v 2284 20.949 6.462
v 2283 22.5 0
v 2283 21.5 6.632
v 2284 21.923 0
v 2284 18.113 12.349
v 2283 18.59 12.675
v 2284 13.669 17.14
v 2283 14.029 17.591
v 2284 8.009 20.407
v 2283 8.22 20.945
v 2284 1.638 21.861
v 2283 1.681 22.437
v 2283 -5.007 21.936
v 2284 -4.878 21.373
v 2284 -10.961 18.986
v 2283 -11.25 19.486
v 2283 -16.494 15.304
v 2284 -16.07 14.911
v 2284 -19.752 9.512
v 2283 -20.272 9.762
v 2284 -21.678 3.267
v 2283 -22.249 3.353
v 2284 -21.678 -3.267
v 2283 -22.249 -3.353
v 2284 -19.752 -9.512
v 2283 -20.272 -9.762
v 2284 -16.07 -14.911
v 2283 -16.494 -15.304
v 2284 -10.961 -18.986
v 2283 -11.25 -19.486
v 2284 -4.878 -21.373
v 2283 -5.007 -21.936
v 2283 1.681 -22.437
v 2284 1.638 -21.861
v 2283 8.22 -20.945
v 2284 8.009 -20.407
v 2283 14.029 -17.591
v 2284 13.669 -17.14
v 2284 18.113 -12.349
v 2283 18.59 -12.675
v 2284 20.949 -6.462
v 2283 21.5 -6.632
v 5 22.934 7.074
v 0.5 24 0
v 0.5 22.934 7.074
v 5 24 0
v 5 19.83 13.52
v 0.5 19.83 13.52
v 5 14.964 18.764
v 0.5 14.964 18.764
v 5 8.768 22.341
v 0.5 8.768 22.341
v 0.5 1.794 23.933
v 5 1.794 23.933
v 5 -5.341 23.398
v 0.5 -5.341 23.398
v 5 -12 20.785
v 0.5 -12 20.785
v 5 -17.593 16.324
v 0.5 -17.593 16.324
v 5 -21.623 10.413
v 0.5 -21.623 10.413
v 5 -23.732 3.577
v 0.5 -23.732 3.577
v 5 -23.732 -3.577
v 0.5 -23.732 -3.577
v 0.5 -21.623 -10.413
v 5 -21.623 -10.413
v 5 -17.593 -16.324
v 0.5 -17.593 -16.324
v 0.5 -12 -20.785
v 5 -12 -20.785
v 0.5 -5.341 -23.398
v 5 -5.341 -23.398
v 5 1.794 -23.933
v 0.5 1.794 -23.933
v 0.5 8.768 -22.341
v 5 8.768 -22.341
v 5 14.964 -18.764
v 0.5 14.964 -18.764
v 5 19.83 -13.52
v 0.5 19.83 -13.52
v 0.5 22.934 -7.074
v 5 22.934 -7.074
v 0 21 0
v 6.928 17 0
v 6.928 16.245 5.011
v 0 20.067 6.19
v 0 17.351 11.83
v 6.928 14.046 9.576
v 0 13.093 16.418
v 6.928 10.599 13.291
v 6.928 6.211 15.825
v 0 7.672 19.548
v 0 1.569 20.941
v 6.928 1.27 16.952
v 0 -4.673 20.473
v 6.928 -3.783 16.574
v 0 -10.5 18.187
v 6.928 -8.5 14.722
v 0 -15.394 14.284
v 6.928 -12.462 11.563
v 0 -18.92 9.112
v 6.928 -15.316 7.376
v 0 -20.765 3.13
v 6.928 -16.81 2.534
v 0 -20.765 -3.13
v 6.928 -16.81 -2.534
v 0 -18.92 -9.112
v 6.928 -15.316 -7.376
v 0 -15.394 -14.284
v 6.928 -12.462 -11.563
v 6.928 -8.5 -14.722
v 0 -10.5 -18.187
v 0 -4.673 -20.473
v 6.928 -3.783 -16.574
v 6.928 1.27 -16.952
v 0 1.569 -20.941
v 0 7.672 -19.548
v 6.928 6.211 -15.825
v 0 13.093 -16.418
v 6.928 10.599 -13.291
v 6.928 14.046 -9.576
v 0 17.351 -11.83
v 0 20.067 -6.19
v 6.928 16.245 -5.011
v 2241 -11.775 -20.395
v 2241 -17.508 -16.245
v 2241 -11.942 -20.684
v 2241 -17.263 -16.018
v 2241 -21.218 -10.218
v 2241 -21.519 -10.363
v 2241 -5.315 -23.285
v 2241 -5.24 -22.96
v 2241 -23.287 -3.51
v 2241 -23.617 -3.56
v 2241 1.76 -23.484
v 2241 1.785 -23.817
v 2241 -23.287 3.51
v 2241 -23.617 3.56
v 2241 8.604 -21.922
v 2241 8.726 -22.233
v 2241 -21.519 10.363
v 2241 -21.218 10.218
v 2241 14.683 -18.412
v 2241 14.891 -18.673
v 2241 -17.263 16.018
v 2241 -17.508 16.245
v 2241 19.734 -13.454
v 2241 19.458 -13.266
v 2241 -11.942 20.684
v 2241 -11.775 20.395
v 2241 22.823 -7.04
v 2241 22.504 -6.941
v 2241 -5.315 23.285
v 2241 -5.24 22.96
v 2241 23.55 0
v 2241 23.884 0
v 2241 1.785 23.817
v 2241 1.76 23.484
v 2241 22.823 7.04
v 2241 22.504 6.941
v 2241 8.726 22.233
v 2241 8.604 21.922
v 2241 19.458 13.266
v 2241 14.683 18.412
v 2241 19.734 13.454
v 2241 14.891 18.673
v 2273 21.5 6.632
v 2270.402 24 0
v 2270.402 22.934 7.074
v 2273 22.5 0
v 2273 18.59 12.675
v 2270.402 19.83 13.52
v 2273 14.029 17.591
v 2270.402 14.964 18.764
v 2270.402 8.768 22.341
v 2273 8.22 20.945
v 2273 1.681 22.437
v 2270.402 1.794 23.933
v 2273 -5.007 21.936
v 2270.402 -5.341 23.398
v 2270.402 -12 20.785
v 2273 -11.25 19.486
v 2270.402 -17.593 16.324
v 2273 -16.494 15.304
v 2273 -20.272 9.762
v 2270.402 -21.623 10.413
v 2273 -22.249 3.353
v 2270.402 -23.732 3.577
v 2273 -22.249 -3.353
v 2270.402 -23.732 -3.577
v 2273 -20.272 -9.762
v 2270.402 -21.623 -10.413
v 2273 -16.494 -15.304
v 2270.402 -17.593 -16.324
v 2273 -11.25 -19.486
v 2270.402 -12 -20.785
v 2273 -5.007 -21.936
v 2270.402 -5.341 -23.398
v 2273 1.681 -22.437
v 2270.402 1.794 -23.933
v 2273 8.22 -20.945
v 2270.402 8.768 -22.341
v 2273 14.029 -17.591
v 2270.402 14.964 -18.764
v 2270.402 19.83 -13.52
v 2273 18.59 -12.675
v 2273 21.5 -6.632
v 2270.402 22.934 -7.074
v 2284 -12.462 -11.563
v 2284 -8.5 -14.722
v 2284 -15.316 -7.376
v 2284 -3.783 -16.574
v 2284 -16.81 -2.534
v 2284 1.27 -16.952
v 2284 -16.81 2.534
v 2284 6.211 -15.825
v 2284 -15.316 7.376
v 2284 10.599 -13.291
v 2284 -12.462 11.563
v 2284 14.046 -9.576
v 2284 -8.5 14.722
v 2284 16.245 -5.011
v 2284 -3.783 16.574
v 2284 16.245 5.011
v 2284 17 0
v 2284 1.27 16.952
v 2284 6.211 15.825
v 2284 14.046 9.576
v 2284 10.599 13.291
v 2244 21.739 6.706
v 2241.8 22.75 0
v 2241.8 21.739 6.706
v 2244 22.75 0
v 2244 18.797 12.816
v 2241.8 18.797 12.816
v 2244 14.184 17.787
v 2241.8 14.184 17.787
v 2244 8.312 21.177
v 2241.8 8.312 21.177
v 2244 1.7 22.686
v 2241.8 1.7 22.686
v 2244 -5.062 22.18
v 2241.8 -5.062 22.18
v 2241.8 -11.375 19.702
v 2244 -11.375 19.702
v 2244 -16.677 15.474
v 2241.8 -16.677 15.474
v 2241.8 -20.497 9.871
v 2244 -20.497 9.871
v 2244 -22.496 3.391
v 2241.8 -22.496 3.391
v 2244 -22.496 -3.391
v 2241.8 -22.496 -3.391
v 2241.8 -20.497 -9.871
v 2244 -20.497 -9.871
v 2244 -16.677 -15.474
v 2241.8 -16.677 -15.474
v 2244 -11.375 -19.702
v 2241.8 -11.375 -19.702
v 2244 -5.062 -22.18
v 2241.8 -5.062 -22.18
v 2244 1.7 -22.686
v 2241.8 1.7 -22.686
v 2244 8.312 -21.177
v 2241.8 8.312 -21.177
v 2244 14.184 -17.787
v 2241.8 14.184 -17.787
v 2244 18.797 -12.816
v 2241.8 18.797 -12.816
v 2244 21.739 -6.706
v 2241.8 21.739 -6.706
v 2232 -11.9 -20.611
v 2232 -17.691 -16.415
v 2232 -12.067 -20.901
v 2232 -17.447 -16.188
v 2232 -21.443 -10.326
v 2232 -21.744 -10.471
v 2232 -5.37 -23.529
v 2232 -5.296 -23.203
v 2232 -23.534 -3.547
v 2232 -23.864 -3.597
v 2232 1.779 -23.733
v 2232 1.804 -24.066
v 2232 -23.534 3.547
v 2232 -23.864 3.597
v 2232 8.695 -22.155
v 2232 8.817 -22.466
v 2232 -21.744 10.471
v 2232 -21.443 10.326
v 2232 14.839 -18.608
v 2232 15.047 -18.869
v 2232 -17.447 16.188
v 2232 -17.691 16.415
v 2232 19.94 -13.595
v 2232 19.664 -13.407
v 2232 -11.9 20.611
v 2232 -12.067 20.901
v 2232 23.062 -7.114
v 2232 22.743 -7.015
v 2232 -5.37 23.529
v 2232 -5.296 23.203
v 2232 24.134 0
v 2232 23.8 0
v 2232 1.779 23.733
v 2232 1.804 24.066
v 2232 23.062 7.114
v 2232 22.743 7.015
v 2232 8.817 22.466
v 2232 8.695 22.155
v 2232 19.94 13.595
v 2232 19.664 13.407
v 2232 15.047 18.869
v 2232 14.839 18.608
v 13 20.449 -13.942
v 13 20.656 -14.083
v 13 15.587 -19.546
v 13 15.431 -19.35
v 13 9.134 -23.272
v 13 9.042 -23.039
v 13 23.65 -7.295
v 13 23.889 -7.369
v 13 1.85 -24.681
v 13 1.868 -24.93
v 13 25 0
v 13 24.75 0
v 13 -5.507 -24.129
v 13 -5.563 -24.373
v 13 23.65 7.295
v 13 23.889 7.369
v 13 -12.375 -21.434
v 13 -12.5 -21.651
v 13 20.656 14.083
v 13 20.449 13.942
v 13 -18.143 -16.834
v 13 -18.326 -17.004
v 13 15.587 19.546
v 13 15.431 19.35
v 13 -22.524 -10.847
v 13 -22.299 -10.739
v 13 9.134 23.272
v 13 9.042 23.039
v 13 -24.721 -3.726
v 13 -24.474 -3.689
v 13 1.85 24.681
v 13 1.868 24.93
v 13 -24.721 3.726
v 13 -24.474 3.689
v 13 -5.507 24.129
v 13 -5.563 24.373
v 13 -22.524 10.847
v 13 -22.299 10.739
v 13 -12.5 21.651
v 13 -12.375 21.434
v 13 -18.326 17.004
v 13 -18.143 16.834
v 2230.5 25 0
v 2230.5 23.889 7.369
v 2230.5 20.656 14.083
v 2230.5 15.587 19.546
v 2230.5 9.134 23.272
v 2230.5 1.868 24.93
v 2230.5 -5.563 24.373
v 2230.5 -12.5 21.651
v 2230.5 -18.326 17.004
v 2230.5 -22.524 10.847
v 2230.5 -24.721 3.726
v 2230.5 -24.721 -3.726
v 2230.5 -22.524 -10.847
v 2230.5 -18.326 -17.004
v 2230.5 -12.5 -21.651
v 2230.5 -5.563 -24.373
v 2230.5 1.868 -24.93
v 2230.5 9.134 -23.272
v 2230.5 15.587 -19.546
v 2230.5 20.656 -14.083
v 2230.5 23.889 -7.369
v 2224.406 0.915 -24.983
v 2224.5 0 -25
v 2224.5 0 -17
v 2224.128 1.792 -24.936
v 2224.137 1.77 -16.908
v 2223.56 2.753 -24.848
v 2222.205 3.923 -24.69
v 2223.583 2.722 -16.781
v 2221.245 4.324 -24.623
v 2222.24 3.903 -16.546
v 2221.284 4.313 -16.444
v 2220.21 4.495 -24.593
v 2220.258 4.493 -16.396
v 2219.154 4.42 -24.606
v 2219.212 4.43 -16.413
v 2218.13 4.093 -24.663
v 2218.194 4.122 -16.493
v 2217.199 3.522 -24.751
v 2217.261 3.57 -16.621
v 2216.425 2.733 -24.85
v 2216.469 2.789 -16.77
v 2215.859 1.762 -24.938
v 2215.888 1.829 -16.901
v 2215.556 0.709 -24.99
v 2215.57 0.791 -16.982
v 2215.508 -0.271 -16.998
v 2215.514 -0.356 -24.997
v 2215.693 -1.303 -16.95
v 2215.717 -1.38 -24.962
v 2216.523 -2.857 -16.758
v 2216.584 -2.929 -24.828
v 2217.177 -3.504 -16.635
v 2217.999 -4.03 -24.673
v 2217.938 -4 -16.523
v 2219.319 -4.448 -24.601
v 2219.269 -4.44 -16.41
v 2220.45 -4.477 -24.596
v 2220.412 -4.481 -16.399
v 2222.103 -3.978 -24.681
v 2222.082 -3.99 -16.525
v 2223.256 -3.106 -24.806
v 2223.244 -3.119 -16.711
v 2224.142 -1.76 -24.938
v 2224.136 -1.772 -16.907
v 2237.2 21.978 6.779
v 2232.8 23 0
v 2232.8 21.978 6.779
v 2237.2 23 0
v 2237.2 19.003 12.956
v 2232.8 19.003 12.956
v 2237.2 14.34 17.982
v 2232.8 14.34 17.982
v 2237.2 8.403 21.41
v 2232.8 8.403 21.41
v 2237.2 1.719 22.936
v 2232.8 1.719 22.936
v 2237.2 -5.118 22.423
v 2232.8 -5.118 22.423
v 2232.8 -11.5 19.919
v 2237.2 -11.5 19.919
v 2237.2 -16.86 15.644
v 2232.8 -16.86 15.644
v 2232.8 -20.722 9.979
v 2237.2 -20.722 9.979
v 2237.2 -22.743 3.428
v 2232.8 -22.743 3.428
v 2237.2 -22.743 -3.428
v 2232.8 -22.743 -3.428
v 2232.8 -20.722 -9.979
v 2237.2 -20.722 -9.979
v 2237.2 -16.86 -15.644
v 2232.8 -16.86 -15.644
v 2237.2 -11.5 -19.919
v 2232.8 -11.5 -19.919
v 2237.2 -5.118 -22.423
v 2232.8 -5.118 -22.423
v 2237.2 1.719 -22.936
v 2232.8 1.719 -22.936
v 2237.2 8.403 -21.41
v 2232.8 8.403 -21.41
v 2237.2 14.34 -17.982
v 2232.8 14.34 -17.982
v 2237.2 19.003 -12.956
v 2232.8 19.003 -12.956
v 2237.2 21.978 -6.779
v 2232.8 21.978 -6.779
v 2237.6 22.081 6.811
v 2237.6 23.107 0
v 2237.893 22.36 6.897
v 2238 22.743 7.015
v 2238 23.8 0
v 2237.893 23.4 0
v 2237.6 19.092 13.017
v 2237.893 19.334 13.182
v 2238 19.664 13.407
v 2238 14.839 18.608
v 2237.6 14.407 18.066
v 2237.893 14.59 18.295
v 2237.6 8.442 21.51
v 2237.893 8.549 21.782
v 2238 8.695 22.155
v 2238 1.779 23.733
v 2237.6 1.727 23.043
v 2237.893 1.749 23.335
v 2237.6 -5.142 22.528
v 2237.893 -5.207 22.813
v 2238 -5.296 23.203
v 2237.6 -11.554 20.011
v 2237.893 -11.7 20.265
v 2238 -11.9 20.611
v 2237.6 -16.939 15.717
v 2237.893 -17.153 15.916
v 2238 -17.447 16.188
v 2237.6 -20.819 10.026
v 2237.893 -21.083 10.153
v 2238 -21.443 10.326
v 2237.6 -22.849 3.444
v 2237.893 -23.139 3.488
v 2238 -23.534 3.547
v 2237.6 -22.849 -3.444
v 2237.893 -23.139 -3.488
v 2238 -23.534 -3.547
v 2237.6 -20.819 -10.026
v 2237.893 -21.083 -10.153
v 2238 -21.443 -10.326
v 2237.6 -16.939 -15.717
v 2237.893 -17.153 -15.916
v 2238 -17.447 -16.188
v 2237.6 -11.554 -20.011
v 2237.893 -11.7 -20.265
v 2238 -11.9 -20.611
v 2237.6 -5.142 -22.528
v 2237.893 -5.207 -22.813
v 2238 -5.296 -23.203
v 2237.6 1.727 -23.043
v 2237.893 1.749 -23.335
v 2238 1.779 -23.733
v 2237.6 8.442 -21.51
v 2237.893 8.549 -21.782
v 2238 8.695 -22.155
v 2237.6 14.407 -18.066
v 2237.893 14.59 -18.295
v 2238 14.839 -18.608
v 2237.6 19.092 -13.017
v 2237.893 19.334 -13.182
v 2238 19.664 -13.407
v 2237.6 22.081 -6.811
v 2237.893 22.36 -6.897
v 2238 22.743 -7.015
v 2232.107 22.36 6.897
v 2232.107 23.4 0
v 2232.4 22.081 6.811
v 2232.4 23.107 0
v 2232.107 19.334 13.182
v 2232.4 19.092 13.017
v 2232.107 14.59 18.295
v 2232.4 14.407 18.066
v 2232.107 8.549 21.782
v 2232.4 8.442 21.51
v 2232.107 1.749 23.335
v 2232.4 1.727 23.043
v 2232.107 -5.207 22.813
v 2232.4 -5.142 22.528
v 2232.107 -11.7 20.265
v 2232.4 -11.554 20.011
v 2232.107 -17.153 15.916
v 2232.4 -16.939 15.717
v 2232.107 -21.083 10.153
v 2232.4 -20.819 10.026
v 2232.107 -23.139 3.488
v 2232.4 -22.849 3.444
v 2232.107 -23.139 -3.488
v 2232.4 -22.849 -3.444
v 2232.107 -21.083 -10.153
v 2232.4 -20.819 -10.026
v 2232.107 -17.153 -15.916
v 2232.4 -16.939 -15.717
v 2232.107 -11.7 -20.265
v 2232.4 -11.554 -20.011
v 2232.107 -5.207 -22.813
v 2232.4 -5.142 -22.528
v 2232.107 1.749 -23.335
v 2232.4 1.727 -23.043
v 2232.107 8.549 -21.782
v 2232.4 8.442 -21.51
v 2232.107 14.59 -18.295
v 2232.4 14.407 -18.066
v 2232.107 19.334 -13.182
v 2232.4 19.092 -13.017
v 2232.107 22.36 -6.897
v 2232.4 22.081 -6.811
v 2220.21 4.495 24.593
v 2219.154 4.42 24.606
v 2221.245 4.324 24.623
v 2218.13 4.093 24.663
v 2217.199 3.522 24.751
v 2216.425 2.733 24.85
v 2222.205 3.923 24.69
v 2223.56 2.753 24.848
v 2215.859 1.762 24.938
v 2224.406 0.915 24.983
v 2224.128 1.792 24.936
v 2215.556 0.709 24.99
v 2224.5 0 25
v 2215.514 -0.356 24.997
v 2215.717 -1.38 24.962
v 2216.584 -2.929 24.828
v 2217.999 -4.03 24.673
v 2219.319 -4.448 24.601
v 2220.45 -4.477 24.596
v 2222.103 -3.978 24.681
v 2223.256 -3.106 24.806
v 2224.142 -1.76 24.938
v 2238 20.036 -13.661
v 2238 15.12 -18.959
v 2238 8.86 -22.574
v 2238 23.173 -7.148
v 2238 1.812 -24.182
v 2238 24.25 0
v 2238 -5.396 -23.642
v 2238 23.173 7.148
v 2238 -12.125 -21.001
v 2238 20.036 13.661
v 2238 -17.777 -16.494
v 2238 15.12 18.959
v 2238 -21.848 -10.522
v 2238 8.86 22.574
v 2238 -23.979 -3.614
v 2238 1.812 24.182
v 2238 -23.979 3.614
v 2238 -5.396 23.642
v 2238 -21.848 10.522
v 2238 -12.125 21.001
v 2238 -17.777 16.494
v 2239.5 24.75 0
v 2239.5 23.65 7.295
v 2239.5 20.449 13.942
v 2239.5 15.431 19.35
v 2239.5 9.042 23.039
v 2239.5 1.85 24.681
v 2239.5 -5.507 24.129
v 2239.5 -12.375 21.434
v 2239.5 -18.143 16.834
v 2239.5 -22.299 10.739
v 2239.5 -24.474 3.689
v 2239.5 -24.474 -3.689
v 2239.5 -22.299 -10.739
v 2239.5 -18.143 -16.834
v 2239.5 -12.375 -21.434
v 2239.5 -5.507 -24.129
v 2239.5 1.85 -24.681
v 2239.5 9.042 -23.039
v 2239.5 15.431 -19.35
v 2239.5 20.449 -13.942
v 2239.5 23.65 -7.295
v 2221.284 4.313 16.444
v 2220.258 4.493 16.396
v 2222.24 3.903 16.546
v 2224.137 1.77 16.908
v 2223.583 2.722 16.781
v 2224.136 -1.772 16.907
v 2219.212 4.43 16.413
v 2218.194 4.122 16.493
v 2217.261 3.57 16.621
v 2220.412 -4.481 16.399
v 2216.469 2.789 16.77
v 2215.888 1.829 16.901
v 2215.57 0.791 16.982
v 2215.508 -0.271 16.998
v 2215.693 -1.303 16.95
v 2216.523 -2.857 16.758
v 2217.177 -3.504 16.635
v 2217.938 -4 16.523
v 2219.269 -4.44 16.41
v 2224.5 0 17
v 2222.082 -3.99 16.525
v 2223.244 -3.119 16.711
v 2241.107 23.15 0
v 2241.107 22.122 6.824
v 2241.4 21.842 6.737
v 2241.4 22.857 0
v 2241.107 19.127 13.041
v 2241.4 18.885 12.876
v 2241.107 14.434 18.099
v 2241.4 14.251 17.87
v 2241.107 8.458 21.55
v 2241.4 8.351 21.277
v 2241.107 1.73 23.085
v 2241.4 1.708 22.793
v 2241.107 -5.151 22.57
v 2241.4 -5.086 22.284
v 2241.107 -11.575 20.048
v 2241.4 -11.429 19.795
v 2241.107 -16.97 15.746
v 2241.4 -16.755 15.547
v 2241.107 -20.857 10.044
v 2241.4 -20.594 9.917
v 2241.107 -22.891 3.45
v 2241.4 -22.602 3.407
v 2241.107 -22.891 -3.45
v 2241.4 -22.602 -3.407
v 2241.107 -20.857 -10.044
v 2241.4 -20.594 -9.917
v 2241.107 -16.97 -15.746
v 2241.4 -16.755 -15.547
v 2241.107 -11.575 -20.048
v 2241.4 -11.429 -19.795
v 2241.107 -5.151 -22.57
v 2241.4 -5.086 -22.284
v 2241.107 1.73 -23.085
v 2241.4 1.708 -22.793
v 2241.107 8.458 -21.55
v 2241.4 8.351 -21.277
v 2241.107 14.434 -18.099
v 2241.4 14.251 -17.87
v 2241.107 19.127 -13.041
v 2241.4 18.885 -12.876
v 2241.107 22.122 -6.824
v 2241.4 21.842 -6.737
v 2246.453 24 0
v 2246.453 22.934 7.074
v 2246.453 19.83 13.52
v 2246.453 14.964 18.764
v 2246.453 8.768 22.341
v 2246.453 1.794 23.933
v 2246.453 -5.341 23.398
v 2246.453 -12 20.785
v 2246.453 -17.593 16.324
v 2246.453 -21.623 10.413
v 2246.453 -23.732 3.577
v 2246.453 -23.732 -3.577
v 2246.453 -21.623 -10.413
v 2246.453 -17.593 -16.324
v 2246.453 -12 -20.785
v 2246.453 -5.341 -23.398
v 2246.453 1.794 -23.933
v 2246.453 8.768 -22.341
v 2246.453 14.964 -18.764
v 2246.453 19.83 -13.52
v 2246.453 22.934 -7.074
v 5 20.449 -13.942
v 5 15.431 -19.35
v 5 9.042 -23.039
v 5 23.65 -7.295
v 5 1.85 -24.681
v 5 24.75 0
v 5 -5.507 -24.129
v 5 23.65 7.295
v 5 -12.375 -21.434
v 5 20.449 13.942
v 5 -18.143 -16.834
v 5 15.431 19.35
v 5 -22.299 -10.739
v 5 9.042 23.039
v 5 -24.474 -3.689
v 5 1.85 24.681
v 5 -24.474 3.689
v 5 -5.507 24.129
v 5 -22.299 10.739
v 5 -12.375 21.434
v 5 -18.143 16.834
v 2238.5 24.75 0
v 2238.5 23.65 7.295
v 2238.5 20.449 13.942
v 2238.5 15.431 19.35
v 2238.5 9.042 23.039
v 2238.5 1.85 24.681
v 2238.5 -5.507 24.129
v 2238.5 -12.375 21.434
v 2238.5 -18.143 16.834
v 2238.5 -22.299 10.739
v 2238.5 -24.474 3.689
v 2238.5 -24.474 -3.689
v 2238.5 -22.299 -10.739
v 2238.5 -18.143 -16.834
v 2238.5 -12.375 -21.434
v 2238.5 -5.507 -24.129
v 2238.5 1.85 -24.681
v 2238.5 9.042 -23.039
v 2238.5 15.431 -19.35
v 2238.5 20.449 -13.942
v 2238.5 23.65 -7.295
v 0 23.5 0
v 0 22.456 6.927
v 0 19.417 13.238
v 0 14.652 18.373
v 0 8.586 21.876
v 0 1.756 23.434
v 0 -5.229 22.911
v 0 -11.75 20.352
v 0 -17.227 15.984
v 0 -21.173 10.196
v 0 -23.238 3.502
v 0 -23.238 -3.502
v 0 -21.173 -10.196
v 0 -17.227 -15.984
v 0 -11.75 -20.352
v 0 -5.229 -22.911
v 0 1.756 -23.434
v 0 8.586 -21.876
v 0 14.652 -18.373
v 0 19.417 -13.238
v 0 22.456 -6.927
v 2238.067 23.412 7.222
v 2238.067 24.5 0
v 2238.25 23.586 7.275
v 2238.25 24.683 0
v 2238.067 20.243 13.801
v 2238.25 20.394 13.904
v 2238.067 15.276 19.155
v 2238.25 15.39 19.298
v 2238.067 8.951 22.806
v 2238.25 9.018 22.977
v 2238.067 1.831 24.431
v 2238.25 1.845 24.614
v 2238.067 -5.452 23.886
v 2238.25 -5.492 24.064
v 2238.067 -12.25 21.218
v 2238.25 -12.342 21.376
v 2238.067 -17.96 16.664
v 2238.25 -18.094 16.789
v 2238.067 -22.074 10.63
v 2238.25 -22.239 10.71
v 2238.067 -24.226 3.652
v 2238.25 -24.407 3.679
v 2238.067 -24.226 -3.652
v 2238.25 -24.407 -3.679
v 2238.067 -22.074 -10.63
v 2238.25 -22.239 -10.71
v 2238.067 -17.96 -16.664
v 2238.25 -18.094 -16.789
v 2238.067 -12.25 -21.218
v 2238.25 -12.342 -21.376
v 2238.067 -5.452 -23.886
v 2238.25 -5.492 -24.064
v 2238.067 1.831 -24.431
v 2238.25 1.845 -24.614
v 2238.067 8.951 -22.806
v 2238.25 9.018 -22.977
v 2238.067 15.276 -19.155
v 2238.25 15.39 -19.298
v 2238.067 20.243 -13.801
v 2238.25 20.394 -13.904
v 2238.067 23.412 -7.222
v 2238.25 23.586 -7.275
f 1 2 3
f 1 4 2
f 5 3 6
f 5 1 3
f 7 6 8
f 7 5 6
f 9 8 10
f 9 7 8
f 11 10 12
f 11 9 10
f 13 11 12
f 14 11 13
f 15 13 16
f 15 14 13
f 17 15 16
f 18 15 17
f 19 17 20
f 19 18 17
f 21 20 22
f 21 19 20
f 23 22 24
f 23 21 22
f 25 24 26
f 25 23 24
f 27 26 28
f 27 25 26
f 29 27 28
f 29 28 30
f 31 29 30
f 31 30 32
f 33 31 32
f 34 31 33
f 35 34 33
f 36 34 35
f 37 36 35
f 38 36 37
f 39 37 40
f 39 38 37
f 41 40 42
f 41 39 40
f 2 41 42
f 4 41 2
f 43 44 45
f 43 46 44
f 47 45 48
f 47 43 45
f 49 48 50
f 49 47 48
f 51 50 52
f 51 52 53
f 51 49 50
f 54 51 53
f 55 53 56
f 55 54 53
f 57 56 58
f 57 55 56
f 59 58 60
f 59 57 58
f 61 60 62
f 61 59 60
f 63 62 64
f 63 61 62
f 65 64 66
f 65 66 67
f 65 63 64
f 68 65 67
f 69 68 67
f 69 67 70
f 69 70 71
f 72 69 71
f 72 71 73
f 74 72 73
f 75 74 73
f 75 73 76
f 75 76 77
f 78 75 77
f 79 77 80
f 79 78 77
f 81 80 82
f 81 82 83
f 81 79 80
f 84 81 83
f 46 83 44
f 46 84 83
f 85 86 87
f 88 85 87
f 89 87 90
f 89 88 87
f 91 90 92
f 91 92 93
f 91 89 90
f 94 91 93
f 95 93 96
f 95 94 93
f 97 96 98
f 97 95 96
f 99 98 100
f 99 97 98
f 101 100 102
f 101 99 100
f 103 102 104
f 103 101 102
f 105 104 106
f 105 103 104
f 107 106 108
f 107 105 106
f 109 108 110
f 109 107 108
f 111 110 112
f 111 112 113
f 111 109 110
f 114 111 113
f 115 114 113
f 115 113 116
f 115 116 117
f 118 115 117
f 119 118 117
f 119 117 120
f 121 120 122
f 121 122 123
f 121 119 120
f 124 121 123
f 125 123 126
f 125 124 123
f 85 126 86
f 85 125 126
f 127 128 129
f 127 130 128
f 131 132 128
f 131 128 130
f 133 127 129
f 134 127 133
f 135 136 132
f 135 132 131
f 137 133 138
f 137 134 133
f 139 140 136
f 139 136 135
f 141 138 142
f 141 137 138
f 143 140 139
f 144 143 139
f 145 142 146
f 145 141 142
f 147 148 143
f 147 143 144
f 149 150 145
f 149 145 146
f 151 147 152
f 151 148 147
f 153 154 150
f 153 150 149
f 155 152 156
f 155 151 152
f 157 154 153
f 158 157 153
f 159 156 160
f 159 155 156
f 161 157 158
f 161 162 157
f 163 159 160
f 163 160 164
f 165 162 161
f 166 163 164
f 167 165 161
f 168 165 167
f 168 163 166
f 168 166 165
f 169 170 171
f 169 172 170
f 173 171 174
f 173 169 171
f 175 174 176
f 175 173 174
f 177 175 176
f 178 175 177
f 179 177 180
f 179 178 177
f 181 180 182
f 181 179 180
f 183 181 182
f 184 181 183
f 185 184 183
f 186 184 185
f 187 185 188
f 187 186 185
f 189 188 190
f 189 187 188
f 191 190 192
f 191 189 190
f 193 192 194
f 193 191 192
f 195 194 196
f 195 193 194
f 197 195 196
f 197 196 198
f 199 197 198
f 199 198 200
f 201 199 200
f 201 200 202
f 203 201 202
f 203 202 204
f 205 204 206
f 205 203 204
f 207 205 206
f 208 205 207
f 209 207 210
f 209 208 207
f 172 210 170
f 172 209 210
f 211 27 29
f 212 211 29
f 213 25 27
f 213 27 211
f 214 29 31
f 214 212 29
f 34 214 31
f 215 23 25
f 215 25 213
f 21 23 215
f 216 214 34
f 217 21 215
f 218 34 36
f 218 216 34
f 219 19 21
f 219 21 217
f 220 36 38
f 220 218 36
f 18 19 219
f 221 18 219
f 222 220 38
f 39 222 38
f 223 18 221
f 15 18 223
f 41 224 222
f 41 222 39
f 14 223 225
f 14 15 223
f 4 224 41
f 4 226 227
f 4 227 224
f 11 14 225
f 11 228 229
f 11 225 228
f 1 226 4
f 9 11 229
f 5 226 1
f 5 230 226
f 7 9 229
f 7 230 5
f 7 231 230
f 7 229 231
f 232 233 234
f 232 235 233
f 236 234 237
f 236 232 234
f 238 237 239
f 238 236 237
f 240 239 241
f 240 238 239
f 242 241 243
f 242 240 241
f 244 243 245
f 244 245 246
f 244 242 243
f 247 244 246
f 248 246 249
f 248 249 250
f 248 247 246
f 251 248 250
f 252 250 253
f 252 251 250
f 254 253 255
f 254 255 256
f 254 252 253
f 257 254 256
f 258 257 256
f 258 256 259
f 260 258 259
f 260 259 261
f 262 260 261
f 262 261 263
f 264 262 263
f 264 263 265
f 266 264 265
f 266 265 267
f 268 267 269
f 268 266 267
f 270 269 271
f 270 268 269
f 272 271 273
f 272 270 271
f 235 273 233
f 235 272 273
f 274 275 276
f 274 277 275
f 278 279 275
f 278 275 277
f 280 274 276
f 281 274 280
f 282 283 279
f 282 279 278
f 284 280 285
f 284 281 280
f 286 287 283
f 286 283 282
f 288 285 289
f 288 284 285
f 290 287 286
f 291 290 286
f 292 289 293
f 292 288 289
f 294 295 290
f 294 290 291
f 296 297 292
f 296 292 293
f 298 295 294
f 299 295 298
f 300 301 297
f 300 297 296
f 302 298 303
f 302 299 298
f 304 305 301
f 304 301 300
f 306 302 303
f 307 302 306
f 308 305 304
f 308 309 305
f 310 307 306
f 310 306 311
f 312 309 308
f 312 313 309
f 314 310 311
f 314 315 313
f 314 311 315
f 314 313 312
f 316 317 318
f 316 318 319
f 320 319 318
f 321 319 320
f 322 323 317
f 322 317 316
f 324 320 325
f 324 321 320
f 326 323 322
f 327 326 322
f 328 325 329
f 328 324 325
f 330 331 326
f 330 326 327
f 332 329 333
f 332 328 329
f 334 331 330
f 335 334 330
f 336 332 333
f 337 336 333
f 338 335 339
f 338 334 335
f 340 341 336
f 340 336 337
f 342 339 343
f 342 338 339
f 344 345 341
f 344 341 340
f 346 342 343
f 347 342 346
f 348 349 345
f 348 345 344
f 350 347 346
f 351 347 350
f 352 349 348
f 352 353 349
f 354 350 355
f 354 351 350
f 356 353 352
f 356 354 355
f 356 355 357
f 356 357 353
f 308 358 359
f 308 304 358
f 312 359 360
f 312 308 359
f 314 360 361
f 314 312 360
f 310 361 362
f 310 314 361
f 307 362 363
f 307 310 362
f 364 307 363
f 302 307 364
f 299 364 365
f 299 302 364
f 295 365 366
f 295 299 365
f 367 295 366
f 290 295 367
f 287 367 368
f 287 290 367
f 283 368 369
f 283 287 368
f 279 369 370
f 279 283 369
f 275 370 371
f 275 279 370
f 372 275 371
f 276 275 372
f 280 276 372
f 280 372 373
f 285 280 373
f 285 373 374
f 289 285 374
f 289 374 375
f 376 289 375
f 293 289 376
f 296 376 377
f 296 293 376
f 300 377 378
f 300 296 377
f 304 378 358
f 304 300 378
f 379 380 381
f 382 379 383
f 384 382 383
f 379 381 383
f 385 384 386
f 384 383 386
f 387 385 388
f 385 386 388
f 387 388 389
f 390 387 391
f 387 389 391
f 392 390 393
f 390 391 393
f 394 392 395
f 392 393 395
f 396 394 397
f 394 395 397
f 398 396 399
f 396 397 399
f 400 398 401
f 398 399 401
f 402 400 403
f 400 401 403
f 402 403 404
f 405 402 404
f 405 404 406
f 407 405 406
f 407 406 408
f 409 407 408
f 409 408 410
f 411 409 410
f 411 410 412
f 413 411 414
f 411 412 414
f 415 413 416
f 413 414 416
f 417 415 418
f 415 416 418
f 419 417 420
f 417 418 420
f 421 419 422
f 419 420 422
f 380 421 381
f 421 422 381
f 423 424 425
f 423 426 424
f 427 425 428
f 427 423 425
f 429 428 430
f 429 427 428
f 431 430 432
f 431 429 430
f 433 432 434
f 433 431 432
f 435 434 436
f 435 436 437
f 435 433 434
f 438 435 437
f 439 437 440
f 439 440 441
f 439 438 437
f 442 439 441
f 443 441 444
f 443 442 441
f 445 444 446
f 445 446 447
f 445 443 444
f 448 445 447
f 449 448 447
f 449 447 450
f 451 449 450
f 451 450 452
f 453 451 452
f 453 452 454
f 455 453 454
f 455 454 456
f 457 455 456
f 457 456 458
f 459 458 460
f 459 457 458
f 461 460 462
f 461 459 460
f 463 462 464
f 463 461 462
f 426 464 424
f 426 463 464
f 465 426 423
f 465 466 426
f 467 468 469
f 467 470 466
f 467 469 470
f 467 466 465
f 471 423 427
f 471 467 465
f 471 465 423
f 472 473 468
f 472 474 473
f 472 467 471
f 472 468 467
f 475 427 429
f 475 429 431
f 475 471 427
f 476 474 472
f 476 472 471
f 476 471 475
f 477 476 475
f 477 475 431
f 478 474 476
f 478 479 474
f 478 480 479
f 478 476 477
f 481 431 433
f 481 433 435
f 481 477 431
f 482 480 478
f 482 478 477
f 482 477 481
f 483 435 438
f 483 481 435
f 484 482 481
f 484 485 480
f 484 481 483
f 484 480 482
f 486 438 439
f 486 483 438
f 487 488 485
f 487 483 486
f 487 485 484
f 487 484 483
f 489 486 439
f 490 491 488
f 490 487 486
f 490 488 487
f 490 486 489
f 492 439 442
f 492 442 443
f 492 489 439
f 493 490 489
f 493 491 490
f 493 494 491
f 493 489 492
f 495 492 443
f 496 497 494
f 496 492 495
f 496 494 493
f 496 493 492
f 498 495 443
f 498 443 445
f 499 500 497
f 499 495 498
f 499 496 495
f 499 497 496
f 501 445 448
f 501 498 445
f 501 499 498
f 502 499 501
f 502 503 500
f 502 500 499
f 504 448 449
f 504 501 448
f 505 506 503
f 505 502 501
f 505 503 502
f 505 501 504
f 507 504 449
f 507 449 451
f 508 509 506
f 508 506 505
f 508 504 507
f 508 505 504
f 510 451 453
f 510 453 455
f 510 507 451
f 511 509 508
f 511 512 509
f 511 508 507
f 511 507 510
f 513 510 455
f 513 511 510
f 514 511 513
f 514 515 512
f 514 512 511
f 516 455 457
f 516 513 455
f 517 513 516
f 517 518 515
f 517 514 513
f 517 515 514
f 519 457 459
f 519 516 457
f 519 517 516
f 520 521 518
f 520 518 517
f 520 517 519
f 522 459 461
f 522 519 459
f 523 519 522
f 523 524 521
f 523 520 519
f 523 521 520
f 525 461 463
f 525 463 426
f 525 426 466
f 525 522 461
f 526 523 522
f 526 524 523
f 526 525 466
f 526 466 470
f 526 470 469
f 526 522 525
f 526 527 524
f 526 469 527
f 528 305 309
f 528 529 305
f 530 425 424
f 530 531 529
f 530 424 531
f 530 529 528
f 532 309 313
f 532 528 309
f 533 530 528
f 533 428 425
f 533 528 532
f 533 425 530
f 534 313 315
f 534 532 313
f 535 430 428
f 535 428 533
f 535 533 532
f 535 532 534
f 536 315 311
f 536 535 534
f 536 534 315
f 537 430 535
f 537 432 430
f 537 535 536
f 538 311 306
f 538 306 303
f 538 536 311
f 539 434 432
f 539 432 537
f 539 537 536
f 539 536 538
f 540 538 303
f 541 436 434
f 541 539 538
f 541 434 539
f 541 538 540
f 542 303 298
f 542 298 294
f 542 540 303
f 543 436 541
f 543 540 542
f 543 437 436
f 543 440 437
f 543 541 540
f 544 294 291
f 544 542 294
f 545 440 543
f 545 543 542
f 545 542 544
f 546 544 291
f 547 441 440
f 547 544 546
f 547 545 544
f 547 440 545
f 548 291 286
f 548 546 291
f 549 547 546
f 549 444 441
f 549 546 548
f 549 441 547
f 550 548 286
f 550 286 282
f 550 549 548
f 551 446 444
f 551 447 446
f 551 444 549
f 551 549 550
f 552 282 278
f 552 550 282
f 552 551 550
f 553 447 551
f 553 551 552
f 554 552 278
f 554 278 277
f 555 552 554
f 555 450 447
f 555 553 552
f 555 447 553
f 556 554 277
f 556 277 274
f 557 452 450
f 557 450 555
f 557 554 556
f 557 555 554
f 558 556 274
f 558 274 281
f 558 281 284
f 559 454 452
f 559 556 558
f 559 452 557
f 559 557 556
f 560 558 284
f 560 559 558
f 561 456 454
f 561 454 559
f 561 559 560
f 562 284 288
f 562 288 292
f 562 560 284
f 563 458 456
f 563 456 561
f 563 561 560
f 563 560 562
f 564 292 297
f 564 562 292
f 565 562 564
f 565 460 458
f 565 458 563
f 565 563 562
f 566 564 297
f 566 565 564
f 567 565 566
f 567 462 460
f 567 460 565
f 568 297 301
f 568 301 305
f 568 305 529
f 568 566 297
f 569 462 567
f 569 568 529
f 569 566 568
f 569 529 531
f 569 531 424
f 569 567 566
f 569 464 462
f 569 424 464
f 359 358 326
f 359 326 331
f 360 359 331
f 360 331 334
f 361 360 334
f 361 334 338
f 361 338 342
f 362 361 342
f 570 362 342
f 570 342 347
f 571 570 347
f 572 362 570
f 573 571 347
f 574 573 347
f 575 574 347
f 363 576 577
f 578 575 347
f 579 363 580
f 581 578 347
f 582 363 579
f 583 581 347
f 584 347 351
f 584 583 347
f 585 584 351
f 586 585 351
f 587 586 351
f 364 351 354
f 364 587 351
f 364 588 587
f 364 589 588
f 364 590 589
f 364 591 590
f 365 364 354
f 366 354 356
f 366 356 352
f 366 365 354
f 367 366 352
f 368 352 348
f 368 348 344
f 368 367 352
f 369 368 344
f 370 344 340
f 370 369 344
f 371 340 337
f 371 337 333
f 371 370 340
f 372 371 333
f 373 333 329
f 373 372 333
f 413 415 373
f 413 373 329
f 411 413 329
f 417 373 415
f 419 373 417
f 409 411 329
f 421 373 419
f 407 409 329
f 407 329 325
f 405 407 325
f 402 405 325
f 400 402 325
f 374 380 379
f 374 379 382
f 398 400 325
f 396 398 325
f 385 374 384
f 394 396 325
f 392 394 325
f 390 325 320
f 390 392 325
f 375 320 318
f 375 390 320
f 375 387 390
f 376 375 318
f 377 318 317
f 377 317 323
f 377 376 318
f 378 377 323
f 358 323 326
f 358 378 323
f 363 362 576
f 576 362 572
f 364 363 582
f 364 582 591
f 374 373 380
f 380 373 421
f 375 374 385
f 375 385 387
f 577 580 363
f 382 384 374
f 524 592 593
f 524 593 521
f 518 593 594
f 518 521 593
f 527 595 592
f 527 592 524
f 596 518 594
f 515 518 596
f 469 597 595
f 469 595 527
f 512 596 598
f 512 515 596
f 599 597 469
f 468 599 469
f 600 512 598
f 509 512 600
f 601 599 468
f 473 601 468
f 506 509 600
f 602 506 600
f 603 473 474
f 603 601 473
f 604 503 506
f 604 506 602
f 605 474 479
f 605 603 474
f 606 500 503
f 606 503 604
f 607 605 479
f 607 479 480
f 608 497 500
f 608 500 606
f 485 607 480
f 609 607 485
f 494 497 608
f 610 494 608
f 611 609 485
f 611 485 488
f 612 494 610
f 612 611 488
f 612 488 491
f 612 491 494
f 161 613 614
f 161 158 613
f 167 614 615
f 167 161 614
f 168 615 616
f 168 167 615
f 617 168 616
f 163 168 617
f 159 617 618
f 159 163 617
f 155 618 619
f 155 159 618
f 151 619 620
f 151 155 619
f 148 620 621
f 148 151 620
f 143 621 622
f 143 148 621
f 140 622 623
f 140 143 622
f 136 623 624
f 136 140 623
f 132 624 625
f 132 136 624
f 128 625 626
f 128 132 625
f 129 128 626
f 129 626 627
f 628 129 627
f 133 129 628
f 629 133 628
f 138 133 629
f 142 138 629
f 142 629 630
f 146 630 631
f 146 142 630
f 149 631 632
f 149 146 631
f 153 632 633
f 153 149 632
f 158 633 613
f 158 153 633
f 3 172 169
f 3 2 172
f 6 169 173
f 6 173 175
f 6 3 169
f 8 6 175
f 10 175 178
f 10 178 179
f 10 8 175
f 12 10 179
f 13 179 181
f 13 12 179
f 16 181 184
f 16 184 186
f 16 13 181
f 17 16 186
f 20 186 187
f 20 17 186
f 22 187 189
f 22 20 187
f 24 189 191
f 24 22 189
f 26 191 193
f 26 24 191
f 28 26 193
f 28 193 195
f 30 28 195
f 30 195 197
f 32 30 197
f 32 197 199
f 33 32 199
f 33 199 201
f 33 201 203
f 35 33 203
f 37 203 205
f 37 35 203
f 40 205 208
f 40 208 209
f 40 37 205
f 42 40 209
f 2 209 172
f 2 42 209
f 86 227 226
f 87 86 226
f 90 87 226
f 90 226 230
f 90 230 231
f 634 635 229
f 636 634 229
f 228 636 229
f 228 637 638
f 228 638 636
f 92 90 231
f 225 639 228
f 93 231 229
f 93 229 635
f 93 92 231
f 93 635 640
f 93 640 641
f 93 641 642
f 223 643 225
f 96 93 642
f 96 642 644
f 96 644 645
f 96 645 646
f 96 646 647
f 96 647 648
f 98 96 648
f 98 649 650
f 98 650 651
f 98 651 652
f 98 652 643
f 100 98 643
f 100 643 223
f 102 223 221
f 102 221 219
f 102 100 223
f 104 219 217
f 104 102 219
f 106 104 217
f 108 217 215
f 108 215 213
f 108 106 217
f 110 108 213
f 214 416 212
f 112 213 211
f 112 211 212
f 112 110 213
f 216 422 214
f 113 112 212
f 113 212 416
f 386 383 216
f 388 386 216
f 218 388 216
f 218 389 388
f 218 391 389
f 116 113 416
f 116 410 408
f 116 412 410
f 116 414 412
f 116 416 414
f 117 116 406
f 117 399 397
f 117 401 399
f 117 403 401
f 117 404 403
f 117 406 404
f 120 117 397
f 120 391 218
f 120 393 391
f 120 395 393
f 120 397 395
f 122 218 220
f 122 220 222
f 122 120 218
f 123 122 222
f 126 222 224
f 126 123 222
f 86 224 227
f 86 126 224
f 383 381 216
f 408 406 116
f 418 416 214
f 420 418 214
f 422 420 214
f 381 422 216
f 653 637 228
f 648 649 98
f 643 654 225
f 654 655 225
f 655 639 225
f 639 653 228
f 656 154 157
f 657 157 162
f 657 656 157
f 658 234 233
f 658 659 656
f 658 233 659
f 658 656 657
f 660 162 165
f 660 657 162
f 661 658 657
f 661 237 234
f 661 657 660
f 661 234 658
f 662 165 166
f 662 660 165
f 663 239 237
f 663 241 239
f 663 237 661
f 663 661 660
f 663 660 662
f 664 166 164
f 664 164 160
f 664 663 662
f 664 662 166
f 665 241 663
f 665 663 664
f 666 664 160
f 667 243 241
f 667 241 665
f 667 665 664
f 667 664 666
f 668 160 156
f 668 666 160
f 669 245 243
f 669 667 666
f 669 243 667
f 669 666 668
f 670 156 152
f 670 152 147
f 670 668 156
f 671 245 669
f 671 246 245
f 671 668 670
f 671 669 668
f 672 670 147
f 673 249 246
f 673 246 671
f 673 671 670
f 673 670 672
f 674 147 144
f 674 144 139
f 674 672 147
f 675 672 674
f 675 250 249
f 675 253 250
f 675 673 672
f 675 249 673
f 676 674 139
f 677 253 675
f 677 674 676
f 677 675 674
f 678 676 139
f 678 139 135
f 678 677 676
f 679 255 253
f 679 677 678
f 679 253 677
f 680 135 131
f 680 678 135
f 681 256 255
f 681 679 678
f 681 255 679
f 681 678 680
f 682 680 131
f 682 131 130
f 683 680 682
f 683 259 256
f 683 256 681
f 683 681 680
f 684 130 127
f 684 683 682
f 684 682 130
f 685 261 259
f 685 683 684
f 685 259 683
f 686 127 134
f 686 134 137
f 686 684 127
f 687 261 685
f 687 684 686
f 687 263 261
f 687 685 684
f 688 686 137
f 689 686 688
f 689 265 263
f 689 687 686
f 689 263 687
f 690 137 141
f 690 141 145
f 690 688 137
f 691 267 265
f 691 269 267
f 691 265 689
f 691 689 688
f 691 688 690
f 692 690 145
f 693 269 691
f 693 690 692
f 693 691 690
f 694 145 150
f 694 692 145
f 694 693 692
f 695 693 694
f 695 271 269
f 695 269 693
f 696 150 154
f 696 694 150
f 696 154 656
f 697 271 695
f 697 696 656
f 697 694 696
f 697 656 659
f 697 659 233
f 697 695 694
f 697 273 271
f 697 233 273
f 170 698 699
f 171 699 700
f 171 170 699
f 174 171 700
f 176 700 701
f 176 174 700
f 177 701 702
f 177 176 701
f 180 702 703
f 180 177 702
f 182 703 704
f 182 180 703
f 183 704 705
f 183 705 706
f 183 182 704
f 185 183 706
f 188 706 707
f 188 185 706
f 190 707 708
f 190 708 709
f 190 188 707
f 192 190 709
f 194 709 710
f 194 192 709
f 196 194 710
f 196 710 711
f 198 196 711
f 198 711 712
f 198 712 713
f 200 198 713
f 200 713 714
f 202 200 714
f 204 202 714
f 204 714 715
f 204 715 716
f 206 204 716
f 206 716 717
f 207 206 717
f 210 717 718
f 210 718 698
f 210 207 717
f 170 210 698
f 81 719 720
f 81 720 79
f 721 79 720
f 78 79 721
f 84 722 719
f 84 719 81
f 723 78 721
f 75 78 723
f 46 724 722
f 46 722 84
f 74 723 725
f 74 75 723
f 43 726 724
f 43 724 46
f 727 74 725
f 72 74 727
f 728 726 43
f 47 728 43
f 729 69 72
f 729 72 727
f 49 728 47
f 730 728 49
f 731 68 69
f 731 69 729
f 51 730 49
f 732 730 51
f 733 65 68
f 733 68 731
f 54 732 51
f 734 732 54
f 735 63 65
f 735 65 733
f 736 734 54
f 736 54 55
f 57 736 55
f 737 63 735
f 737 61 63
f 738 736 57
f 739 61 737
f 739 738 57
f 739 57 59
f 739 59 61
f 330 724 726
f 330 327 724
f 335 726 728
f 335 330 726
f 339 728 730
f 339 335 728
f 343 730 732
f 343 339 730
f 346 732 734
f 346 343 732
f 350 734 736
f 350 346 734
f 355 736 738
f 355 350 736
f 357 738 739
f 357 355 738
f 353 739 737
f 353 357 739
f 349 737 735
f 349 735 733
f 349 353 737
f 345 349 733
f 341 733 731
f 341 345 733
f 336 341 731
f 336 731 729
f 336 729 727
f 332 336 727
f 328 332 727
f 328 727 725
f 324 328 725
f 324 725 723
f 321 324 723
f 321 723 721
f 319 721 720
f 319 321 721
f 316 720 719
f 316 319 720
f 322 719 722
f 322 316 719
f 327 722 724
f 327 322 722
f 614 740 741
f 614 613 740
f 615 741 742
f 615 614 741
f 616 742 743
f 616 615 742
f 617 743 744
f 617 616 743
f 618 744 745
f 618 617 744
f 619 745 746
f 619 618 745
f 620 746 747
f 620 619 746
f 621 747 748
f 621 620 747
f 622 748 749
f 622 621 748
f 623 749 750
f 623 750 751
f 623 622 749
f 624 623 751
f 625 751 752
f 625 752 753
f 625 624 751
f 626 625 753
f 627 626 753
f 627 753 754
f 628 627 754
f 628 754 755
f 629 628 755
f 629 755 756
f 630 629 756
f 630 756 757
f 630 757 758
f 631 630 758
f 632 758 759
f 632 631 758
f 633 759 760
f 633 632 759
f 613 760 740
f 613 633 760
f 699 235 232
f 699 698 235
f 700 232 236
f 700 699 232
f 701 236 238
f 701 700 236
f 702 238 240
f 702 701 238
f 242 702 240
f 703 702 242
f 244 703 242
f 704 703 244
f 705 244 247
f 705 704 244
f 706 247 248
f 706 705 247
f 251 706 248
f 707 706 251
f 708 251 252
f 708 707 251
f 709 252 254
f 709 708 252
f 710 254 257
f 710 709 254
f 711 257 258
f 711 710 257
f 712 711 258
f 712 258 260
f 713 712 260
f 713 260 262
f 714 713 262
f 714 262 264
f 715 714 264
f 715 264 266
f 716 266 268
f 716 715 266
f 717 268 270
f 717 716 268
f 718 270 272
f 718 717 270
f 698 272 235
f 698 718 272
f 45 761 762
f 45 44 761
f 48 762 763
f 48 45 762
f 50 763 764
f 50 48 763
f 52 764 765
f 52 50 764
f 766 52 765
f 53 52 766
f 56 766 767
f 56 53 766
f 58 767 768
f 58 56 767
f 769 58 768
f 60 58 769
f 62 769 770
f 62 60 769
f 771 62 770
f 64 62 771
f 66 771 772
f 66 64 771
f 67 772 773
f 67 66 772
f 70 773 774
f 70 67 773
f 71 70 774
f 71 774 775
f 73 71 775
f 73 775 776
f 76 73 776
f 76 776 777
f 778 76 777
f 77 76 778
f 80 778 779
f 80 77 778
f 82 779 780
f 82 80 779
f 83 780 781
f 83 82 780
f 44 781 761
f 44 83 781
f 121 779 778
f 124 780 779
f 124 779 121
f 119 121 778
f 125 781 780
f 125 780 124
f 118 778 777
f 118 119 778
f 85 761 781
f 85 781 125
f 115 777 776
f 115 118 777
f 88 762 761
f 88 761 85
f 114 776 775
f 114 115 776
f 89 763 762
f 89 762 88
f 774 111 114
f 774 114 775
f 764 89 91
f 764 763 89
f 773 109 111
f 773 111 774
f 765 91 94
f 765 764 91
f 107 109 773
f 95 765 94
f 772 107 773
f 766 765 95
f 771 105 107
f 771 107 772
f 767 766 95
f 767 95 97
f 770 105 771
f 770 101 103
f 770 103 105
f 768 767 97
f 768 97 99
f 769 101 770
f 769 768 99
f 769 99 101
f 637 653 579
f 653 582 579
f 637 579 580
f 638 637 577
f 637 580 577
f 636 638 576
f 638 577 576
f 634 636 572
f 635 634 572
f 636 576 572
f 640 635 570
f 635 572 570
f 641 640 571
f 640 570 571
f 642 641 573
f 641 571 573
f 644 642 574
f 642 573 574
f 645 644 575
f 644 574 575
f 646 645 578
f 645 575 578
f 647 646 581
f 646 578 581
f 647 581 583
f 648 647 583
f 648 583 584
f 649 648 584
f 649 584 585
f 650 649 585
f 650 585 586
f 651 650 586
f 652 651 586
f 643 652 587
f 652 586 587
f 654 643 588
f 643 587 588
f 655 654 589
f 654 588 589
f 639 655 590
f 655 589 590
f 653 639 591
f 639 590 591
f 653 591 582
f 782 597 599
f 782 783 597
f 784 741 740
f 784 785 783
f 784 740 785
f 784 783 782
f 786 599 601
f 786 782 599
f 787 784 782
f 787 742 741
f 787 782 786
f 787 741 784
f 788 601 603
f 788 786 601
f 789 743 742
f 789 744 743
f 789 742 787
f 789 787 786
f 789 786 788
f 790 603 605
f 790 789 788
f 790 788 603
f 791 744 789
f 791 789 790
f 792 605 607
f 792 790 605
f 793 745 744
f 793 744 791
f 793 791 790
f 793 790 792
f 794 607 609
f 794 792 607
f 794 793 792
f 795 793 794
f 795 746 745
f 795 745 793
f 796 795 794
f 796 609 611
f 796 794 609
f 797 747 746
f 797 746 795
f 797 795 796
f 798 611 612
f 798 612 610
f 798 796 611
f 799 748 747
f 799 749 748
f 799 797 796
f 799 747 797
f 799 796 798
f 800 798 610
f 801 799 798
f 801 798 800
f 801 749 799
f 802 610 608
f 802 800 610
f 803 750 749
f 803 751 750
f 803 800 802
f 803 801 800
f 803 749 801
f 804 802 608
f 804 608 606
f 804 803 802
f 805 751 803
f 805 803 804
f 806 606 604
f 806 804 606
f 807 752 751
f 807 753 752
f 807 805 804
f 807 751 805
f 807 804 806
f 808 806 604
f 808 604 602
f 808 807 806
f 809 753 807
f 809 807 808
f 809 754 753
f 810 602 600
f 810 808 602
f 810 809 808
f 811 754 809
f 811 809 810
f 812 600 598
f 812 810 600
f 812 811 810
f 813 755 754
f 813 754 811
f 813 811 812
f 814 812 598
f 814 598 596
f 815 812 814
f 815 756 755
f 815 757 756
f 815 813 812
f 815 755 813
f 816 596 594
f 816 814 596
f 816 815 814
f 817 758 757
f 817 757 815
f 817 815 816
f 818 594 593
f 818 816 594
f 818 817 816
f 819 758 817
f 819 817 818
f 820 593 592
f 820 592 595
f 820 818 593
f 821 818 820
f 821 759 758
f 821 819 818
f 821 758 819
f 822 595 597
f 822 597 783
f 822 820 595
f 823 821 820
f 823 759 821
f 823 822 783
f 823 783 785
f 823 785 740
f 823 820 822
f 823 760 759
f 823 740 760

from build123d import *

# Parameters (mm, degrees)
SKETCH2_R          = 4.5
CUT_EXTRUDE1_DEPTH = 50


with BuildPart() as part:
    # Sketch1 → Base-Revolve (revolve)
    with BuildSketch(Plane.XY):
        with BuildLine():
            Line((0, 21), (0, 23.5))
            Line((0, 23.5), (0.5, 24))
            Line((0.5, 24), (5, 24))
            Line((5, 24), (5, 24.75))
            Line((5, 24.75), (13, 24.75))
            Line((13, 24.75), (13, 25))
            Line((13, 25), (2230.5, 25))
            Line((2230.5, 25), (2232, 24.133974596))
            Line((2232, 24.133974596), (2232, 23.8))
            ThreePointArc((2232, 23.8), (2232.234314575, 23.234314575), (2232.8, 23))
            Line((2232.8, 23), (2237.2, 23))
            ThreePointArc((2237.2, 23), (2237.765685425, 23.234314575), (2238, 23.8))
            Line((2238, 23.8), (2238, 24.25))
            ThreePointArc((2238, 24.25), (2238.146446609, 24.603553391), (2238.5, 24.75))
            Line((2238.5, 24.75), (2239.5, 24.75))
            Line((2239.5, 24.75), (2241, 23.883974596))
            Line((2241, 23.883974596), (2241, 23.55))
            ThreePointArc((2241, 23.55), (2241.234314575, 22.984314575), (2241.8, 22.75))
            Line((2241.8, 22.75), (2244, 22.75))
            Line((2244, 22.75), (2246.453263132, 24))
            Line((2246.453263132, 24), (2270.401923789, 24))
            Line((2270.401923789, 24), (2273, 22.5))
            Line((2273, 22.5), (2283, 22.5))
            Line((2283, 22.5), (2284, 21.922649731))
            Line((2284, 21.922649731), (2284, 17))
            Line((2284, 17), (6.92820323, 17))
            Line((6.92820323, 17), (0, 21))
        make_face()
    revolve(axis=Axis((0, 0, 0), (1, 0, 0)))

    # Sketch2 → Cut-Extrude1 (cut, symmetric)
    with BuildSketch(Plane.XY):
        with Locations((2220, 0)):
            Circle(SKETCH2_R)
    extrude(amount=CUT_EXTRUDE1_DEPTH, both=True, mode=Mode.SUBTRACT)


solid = part.part
